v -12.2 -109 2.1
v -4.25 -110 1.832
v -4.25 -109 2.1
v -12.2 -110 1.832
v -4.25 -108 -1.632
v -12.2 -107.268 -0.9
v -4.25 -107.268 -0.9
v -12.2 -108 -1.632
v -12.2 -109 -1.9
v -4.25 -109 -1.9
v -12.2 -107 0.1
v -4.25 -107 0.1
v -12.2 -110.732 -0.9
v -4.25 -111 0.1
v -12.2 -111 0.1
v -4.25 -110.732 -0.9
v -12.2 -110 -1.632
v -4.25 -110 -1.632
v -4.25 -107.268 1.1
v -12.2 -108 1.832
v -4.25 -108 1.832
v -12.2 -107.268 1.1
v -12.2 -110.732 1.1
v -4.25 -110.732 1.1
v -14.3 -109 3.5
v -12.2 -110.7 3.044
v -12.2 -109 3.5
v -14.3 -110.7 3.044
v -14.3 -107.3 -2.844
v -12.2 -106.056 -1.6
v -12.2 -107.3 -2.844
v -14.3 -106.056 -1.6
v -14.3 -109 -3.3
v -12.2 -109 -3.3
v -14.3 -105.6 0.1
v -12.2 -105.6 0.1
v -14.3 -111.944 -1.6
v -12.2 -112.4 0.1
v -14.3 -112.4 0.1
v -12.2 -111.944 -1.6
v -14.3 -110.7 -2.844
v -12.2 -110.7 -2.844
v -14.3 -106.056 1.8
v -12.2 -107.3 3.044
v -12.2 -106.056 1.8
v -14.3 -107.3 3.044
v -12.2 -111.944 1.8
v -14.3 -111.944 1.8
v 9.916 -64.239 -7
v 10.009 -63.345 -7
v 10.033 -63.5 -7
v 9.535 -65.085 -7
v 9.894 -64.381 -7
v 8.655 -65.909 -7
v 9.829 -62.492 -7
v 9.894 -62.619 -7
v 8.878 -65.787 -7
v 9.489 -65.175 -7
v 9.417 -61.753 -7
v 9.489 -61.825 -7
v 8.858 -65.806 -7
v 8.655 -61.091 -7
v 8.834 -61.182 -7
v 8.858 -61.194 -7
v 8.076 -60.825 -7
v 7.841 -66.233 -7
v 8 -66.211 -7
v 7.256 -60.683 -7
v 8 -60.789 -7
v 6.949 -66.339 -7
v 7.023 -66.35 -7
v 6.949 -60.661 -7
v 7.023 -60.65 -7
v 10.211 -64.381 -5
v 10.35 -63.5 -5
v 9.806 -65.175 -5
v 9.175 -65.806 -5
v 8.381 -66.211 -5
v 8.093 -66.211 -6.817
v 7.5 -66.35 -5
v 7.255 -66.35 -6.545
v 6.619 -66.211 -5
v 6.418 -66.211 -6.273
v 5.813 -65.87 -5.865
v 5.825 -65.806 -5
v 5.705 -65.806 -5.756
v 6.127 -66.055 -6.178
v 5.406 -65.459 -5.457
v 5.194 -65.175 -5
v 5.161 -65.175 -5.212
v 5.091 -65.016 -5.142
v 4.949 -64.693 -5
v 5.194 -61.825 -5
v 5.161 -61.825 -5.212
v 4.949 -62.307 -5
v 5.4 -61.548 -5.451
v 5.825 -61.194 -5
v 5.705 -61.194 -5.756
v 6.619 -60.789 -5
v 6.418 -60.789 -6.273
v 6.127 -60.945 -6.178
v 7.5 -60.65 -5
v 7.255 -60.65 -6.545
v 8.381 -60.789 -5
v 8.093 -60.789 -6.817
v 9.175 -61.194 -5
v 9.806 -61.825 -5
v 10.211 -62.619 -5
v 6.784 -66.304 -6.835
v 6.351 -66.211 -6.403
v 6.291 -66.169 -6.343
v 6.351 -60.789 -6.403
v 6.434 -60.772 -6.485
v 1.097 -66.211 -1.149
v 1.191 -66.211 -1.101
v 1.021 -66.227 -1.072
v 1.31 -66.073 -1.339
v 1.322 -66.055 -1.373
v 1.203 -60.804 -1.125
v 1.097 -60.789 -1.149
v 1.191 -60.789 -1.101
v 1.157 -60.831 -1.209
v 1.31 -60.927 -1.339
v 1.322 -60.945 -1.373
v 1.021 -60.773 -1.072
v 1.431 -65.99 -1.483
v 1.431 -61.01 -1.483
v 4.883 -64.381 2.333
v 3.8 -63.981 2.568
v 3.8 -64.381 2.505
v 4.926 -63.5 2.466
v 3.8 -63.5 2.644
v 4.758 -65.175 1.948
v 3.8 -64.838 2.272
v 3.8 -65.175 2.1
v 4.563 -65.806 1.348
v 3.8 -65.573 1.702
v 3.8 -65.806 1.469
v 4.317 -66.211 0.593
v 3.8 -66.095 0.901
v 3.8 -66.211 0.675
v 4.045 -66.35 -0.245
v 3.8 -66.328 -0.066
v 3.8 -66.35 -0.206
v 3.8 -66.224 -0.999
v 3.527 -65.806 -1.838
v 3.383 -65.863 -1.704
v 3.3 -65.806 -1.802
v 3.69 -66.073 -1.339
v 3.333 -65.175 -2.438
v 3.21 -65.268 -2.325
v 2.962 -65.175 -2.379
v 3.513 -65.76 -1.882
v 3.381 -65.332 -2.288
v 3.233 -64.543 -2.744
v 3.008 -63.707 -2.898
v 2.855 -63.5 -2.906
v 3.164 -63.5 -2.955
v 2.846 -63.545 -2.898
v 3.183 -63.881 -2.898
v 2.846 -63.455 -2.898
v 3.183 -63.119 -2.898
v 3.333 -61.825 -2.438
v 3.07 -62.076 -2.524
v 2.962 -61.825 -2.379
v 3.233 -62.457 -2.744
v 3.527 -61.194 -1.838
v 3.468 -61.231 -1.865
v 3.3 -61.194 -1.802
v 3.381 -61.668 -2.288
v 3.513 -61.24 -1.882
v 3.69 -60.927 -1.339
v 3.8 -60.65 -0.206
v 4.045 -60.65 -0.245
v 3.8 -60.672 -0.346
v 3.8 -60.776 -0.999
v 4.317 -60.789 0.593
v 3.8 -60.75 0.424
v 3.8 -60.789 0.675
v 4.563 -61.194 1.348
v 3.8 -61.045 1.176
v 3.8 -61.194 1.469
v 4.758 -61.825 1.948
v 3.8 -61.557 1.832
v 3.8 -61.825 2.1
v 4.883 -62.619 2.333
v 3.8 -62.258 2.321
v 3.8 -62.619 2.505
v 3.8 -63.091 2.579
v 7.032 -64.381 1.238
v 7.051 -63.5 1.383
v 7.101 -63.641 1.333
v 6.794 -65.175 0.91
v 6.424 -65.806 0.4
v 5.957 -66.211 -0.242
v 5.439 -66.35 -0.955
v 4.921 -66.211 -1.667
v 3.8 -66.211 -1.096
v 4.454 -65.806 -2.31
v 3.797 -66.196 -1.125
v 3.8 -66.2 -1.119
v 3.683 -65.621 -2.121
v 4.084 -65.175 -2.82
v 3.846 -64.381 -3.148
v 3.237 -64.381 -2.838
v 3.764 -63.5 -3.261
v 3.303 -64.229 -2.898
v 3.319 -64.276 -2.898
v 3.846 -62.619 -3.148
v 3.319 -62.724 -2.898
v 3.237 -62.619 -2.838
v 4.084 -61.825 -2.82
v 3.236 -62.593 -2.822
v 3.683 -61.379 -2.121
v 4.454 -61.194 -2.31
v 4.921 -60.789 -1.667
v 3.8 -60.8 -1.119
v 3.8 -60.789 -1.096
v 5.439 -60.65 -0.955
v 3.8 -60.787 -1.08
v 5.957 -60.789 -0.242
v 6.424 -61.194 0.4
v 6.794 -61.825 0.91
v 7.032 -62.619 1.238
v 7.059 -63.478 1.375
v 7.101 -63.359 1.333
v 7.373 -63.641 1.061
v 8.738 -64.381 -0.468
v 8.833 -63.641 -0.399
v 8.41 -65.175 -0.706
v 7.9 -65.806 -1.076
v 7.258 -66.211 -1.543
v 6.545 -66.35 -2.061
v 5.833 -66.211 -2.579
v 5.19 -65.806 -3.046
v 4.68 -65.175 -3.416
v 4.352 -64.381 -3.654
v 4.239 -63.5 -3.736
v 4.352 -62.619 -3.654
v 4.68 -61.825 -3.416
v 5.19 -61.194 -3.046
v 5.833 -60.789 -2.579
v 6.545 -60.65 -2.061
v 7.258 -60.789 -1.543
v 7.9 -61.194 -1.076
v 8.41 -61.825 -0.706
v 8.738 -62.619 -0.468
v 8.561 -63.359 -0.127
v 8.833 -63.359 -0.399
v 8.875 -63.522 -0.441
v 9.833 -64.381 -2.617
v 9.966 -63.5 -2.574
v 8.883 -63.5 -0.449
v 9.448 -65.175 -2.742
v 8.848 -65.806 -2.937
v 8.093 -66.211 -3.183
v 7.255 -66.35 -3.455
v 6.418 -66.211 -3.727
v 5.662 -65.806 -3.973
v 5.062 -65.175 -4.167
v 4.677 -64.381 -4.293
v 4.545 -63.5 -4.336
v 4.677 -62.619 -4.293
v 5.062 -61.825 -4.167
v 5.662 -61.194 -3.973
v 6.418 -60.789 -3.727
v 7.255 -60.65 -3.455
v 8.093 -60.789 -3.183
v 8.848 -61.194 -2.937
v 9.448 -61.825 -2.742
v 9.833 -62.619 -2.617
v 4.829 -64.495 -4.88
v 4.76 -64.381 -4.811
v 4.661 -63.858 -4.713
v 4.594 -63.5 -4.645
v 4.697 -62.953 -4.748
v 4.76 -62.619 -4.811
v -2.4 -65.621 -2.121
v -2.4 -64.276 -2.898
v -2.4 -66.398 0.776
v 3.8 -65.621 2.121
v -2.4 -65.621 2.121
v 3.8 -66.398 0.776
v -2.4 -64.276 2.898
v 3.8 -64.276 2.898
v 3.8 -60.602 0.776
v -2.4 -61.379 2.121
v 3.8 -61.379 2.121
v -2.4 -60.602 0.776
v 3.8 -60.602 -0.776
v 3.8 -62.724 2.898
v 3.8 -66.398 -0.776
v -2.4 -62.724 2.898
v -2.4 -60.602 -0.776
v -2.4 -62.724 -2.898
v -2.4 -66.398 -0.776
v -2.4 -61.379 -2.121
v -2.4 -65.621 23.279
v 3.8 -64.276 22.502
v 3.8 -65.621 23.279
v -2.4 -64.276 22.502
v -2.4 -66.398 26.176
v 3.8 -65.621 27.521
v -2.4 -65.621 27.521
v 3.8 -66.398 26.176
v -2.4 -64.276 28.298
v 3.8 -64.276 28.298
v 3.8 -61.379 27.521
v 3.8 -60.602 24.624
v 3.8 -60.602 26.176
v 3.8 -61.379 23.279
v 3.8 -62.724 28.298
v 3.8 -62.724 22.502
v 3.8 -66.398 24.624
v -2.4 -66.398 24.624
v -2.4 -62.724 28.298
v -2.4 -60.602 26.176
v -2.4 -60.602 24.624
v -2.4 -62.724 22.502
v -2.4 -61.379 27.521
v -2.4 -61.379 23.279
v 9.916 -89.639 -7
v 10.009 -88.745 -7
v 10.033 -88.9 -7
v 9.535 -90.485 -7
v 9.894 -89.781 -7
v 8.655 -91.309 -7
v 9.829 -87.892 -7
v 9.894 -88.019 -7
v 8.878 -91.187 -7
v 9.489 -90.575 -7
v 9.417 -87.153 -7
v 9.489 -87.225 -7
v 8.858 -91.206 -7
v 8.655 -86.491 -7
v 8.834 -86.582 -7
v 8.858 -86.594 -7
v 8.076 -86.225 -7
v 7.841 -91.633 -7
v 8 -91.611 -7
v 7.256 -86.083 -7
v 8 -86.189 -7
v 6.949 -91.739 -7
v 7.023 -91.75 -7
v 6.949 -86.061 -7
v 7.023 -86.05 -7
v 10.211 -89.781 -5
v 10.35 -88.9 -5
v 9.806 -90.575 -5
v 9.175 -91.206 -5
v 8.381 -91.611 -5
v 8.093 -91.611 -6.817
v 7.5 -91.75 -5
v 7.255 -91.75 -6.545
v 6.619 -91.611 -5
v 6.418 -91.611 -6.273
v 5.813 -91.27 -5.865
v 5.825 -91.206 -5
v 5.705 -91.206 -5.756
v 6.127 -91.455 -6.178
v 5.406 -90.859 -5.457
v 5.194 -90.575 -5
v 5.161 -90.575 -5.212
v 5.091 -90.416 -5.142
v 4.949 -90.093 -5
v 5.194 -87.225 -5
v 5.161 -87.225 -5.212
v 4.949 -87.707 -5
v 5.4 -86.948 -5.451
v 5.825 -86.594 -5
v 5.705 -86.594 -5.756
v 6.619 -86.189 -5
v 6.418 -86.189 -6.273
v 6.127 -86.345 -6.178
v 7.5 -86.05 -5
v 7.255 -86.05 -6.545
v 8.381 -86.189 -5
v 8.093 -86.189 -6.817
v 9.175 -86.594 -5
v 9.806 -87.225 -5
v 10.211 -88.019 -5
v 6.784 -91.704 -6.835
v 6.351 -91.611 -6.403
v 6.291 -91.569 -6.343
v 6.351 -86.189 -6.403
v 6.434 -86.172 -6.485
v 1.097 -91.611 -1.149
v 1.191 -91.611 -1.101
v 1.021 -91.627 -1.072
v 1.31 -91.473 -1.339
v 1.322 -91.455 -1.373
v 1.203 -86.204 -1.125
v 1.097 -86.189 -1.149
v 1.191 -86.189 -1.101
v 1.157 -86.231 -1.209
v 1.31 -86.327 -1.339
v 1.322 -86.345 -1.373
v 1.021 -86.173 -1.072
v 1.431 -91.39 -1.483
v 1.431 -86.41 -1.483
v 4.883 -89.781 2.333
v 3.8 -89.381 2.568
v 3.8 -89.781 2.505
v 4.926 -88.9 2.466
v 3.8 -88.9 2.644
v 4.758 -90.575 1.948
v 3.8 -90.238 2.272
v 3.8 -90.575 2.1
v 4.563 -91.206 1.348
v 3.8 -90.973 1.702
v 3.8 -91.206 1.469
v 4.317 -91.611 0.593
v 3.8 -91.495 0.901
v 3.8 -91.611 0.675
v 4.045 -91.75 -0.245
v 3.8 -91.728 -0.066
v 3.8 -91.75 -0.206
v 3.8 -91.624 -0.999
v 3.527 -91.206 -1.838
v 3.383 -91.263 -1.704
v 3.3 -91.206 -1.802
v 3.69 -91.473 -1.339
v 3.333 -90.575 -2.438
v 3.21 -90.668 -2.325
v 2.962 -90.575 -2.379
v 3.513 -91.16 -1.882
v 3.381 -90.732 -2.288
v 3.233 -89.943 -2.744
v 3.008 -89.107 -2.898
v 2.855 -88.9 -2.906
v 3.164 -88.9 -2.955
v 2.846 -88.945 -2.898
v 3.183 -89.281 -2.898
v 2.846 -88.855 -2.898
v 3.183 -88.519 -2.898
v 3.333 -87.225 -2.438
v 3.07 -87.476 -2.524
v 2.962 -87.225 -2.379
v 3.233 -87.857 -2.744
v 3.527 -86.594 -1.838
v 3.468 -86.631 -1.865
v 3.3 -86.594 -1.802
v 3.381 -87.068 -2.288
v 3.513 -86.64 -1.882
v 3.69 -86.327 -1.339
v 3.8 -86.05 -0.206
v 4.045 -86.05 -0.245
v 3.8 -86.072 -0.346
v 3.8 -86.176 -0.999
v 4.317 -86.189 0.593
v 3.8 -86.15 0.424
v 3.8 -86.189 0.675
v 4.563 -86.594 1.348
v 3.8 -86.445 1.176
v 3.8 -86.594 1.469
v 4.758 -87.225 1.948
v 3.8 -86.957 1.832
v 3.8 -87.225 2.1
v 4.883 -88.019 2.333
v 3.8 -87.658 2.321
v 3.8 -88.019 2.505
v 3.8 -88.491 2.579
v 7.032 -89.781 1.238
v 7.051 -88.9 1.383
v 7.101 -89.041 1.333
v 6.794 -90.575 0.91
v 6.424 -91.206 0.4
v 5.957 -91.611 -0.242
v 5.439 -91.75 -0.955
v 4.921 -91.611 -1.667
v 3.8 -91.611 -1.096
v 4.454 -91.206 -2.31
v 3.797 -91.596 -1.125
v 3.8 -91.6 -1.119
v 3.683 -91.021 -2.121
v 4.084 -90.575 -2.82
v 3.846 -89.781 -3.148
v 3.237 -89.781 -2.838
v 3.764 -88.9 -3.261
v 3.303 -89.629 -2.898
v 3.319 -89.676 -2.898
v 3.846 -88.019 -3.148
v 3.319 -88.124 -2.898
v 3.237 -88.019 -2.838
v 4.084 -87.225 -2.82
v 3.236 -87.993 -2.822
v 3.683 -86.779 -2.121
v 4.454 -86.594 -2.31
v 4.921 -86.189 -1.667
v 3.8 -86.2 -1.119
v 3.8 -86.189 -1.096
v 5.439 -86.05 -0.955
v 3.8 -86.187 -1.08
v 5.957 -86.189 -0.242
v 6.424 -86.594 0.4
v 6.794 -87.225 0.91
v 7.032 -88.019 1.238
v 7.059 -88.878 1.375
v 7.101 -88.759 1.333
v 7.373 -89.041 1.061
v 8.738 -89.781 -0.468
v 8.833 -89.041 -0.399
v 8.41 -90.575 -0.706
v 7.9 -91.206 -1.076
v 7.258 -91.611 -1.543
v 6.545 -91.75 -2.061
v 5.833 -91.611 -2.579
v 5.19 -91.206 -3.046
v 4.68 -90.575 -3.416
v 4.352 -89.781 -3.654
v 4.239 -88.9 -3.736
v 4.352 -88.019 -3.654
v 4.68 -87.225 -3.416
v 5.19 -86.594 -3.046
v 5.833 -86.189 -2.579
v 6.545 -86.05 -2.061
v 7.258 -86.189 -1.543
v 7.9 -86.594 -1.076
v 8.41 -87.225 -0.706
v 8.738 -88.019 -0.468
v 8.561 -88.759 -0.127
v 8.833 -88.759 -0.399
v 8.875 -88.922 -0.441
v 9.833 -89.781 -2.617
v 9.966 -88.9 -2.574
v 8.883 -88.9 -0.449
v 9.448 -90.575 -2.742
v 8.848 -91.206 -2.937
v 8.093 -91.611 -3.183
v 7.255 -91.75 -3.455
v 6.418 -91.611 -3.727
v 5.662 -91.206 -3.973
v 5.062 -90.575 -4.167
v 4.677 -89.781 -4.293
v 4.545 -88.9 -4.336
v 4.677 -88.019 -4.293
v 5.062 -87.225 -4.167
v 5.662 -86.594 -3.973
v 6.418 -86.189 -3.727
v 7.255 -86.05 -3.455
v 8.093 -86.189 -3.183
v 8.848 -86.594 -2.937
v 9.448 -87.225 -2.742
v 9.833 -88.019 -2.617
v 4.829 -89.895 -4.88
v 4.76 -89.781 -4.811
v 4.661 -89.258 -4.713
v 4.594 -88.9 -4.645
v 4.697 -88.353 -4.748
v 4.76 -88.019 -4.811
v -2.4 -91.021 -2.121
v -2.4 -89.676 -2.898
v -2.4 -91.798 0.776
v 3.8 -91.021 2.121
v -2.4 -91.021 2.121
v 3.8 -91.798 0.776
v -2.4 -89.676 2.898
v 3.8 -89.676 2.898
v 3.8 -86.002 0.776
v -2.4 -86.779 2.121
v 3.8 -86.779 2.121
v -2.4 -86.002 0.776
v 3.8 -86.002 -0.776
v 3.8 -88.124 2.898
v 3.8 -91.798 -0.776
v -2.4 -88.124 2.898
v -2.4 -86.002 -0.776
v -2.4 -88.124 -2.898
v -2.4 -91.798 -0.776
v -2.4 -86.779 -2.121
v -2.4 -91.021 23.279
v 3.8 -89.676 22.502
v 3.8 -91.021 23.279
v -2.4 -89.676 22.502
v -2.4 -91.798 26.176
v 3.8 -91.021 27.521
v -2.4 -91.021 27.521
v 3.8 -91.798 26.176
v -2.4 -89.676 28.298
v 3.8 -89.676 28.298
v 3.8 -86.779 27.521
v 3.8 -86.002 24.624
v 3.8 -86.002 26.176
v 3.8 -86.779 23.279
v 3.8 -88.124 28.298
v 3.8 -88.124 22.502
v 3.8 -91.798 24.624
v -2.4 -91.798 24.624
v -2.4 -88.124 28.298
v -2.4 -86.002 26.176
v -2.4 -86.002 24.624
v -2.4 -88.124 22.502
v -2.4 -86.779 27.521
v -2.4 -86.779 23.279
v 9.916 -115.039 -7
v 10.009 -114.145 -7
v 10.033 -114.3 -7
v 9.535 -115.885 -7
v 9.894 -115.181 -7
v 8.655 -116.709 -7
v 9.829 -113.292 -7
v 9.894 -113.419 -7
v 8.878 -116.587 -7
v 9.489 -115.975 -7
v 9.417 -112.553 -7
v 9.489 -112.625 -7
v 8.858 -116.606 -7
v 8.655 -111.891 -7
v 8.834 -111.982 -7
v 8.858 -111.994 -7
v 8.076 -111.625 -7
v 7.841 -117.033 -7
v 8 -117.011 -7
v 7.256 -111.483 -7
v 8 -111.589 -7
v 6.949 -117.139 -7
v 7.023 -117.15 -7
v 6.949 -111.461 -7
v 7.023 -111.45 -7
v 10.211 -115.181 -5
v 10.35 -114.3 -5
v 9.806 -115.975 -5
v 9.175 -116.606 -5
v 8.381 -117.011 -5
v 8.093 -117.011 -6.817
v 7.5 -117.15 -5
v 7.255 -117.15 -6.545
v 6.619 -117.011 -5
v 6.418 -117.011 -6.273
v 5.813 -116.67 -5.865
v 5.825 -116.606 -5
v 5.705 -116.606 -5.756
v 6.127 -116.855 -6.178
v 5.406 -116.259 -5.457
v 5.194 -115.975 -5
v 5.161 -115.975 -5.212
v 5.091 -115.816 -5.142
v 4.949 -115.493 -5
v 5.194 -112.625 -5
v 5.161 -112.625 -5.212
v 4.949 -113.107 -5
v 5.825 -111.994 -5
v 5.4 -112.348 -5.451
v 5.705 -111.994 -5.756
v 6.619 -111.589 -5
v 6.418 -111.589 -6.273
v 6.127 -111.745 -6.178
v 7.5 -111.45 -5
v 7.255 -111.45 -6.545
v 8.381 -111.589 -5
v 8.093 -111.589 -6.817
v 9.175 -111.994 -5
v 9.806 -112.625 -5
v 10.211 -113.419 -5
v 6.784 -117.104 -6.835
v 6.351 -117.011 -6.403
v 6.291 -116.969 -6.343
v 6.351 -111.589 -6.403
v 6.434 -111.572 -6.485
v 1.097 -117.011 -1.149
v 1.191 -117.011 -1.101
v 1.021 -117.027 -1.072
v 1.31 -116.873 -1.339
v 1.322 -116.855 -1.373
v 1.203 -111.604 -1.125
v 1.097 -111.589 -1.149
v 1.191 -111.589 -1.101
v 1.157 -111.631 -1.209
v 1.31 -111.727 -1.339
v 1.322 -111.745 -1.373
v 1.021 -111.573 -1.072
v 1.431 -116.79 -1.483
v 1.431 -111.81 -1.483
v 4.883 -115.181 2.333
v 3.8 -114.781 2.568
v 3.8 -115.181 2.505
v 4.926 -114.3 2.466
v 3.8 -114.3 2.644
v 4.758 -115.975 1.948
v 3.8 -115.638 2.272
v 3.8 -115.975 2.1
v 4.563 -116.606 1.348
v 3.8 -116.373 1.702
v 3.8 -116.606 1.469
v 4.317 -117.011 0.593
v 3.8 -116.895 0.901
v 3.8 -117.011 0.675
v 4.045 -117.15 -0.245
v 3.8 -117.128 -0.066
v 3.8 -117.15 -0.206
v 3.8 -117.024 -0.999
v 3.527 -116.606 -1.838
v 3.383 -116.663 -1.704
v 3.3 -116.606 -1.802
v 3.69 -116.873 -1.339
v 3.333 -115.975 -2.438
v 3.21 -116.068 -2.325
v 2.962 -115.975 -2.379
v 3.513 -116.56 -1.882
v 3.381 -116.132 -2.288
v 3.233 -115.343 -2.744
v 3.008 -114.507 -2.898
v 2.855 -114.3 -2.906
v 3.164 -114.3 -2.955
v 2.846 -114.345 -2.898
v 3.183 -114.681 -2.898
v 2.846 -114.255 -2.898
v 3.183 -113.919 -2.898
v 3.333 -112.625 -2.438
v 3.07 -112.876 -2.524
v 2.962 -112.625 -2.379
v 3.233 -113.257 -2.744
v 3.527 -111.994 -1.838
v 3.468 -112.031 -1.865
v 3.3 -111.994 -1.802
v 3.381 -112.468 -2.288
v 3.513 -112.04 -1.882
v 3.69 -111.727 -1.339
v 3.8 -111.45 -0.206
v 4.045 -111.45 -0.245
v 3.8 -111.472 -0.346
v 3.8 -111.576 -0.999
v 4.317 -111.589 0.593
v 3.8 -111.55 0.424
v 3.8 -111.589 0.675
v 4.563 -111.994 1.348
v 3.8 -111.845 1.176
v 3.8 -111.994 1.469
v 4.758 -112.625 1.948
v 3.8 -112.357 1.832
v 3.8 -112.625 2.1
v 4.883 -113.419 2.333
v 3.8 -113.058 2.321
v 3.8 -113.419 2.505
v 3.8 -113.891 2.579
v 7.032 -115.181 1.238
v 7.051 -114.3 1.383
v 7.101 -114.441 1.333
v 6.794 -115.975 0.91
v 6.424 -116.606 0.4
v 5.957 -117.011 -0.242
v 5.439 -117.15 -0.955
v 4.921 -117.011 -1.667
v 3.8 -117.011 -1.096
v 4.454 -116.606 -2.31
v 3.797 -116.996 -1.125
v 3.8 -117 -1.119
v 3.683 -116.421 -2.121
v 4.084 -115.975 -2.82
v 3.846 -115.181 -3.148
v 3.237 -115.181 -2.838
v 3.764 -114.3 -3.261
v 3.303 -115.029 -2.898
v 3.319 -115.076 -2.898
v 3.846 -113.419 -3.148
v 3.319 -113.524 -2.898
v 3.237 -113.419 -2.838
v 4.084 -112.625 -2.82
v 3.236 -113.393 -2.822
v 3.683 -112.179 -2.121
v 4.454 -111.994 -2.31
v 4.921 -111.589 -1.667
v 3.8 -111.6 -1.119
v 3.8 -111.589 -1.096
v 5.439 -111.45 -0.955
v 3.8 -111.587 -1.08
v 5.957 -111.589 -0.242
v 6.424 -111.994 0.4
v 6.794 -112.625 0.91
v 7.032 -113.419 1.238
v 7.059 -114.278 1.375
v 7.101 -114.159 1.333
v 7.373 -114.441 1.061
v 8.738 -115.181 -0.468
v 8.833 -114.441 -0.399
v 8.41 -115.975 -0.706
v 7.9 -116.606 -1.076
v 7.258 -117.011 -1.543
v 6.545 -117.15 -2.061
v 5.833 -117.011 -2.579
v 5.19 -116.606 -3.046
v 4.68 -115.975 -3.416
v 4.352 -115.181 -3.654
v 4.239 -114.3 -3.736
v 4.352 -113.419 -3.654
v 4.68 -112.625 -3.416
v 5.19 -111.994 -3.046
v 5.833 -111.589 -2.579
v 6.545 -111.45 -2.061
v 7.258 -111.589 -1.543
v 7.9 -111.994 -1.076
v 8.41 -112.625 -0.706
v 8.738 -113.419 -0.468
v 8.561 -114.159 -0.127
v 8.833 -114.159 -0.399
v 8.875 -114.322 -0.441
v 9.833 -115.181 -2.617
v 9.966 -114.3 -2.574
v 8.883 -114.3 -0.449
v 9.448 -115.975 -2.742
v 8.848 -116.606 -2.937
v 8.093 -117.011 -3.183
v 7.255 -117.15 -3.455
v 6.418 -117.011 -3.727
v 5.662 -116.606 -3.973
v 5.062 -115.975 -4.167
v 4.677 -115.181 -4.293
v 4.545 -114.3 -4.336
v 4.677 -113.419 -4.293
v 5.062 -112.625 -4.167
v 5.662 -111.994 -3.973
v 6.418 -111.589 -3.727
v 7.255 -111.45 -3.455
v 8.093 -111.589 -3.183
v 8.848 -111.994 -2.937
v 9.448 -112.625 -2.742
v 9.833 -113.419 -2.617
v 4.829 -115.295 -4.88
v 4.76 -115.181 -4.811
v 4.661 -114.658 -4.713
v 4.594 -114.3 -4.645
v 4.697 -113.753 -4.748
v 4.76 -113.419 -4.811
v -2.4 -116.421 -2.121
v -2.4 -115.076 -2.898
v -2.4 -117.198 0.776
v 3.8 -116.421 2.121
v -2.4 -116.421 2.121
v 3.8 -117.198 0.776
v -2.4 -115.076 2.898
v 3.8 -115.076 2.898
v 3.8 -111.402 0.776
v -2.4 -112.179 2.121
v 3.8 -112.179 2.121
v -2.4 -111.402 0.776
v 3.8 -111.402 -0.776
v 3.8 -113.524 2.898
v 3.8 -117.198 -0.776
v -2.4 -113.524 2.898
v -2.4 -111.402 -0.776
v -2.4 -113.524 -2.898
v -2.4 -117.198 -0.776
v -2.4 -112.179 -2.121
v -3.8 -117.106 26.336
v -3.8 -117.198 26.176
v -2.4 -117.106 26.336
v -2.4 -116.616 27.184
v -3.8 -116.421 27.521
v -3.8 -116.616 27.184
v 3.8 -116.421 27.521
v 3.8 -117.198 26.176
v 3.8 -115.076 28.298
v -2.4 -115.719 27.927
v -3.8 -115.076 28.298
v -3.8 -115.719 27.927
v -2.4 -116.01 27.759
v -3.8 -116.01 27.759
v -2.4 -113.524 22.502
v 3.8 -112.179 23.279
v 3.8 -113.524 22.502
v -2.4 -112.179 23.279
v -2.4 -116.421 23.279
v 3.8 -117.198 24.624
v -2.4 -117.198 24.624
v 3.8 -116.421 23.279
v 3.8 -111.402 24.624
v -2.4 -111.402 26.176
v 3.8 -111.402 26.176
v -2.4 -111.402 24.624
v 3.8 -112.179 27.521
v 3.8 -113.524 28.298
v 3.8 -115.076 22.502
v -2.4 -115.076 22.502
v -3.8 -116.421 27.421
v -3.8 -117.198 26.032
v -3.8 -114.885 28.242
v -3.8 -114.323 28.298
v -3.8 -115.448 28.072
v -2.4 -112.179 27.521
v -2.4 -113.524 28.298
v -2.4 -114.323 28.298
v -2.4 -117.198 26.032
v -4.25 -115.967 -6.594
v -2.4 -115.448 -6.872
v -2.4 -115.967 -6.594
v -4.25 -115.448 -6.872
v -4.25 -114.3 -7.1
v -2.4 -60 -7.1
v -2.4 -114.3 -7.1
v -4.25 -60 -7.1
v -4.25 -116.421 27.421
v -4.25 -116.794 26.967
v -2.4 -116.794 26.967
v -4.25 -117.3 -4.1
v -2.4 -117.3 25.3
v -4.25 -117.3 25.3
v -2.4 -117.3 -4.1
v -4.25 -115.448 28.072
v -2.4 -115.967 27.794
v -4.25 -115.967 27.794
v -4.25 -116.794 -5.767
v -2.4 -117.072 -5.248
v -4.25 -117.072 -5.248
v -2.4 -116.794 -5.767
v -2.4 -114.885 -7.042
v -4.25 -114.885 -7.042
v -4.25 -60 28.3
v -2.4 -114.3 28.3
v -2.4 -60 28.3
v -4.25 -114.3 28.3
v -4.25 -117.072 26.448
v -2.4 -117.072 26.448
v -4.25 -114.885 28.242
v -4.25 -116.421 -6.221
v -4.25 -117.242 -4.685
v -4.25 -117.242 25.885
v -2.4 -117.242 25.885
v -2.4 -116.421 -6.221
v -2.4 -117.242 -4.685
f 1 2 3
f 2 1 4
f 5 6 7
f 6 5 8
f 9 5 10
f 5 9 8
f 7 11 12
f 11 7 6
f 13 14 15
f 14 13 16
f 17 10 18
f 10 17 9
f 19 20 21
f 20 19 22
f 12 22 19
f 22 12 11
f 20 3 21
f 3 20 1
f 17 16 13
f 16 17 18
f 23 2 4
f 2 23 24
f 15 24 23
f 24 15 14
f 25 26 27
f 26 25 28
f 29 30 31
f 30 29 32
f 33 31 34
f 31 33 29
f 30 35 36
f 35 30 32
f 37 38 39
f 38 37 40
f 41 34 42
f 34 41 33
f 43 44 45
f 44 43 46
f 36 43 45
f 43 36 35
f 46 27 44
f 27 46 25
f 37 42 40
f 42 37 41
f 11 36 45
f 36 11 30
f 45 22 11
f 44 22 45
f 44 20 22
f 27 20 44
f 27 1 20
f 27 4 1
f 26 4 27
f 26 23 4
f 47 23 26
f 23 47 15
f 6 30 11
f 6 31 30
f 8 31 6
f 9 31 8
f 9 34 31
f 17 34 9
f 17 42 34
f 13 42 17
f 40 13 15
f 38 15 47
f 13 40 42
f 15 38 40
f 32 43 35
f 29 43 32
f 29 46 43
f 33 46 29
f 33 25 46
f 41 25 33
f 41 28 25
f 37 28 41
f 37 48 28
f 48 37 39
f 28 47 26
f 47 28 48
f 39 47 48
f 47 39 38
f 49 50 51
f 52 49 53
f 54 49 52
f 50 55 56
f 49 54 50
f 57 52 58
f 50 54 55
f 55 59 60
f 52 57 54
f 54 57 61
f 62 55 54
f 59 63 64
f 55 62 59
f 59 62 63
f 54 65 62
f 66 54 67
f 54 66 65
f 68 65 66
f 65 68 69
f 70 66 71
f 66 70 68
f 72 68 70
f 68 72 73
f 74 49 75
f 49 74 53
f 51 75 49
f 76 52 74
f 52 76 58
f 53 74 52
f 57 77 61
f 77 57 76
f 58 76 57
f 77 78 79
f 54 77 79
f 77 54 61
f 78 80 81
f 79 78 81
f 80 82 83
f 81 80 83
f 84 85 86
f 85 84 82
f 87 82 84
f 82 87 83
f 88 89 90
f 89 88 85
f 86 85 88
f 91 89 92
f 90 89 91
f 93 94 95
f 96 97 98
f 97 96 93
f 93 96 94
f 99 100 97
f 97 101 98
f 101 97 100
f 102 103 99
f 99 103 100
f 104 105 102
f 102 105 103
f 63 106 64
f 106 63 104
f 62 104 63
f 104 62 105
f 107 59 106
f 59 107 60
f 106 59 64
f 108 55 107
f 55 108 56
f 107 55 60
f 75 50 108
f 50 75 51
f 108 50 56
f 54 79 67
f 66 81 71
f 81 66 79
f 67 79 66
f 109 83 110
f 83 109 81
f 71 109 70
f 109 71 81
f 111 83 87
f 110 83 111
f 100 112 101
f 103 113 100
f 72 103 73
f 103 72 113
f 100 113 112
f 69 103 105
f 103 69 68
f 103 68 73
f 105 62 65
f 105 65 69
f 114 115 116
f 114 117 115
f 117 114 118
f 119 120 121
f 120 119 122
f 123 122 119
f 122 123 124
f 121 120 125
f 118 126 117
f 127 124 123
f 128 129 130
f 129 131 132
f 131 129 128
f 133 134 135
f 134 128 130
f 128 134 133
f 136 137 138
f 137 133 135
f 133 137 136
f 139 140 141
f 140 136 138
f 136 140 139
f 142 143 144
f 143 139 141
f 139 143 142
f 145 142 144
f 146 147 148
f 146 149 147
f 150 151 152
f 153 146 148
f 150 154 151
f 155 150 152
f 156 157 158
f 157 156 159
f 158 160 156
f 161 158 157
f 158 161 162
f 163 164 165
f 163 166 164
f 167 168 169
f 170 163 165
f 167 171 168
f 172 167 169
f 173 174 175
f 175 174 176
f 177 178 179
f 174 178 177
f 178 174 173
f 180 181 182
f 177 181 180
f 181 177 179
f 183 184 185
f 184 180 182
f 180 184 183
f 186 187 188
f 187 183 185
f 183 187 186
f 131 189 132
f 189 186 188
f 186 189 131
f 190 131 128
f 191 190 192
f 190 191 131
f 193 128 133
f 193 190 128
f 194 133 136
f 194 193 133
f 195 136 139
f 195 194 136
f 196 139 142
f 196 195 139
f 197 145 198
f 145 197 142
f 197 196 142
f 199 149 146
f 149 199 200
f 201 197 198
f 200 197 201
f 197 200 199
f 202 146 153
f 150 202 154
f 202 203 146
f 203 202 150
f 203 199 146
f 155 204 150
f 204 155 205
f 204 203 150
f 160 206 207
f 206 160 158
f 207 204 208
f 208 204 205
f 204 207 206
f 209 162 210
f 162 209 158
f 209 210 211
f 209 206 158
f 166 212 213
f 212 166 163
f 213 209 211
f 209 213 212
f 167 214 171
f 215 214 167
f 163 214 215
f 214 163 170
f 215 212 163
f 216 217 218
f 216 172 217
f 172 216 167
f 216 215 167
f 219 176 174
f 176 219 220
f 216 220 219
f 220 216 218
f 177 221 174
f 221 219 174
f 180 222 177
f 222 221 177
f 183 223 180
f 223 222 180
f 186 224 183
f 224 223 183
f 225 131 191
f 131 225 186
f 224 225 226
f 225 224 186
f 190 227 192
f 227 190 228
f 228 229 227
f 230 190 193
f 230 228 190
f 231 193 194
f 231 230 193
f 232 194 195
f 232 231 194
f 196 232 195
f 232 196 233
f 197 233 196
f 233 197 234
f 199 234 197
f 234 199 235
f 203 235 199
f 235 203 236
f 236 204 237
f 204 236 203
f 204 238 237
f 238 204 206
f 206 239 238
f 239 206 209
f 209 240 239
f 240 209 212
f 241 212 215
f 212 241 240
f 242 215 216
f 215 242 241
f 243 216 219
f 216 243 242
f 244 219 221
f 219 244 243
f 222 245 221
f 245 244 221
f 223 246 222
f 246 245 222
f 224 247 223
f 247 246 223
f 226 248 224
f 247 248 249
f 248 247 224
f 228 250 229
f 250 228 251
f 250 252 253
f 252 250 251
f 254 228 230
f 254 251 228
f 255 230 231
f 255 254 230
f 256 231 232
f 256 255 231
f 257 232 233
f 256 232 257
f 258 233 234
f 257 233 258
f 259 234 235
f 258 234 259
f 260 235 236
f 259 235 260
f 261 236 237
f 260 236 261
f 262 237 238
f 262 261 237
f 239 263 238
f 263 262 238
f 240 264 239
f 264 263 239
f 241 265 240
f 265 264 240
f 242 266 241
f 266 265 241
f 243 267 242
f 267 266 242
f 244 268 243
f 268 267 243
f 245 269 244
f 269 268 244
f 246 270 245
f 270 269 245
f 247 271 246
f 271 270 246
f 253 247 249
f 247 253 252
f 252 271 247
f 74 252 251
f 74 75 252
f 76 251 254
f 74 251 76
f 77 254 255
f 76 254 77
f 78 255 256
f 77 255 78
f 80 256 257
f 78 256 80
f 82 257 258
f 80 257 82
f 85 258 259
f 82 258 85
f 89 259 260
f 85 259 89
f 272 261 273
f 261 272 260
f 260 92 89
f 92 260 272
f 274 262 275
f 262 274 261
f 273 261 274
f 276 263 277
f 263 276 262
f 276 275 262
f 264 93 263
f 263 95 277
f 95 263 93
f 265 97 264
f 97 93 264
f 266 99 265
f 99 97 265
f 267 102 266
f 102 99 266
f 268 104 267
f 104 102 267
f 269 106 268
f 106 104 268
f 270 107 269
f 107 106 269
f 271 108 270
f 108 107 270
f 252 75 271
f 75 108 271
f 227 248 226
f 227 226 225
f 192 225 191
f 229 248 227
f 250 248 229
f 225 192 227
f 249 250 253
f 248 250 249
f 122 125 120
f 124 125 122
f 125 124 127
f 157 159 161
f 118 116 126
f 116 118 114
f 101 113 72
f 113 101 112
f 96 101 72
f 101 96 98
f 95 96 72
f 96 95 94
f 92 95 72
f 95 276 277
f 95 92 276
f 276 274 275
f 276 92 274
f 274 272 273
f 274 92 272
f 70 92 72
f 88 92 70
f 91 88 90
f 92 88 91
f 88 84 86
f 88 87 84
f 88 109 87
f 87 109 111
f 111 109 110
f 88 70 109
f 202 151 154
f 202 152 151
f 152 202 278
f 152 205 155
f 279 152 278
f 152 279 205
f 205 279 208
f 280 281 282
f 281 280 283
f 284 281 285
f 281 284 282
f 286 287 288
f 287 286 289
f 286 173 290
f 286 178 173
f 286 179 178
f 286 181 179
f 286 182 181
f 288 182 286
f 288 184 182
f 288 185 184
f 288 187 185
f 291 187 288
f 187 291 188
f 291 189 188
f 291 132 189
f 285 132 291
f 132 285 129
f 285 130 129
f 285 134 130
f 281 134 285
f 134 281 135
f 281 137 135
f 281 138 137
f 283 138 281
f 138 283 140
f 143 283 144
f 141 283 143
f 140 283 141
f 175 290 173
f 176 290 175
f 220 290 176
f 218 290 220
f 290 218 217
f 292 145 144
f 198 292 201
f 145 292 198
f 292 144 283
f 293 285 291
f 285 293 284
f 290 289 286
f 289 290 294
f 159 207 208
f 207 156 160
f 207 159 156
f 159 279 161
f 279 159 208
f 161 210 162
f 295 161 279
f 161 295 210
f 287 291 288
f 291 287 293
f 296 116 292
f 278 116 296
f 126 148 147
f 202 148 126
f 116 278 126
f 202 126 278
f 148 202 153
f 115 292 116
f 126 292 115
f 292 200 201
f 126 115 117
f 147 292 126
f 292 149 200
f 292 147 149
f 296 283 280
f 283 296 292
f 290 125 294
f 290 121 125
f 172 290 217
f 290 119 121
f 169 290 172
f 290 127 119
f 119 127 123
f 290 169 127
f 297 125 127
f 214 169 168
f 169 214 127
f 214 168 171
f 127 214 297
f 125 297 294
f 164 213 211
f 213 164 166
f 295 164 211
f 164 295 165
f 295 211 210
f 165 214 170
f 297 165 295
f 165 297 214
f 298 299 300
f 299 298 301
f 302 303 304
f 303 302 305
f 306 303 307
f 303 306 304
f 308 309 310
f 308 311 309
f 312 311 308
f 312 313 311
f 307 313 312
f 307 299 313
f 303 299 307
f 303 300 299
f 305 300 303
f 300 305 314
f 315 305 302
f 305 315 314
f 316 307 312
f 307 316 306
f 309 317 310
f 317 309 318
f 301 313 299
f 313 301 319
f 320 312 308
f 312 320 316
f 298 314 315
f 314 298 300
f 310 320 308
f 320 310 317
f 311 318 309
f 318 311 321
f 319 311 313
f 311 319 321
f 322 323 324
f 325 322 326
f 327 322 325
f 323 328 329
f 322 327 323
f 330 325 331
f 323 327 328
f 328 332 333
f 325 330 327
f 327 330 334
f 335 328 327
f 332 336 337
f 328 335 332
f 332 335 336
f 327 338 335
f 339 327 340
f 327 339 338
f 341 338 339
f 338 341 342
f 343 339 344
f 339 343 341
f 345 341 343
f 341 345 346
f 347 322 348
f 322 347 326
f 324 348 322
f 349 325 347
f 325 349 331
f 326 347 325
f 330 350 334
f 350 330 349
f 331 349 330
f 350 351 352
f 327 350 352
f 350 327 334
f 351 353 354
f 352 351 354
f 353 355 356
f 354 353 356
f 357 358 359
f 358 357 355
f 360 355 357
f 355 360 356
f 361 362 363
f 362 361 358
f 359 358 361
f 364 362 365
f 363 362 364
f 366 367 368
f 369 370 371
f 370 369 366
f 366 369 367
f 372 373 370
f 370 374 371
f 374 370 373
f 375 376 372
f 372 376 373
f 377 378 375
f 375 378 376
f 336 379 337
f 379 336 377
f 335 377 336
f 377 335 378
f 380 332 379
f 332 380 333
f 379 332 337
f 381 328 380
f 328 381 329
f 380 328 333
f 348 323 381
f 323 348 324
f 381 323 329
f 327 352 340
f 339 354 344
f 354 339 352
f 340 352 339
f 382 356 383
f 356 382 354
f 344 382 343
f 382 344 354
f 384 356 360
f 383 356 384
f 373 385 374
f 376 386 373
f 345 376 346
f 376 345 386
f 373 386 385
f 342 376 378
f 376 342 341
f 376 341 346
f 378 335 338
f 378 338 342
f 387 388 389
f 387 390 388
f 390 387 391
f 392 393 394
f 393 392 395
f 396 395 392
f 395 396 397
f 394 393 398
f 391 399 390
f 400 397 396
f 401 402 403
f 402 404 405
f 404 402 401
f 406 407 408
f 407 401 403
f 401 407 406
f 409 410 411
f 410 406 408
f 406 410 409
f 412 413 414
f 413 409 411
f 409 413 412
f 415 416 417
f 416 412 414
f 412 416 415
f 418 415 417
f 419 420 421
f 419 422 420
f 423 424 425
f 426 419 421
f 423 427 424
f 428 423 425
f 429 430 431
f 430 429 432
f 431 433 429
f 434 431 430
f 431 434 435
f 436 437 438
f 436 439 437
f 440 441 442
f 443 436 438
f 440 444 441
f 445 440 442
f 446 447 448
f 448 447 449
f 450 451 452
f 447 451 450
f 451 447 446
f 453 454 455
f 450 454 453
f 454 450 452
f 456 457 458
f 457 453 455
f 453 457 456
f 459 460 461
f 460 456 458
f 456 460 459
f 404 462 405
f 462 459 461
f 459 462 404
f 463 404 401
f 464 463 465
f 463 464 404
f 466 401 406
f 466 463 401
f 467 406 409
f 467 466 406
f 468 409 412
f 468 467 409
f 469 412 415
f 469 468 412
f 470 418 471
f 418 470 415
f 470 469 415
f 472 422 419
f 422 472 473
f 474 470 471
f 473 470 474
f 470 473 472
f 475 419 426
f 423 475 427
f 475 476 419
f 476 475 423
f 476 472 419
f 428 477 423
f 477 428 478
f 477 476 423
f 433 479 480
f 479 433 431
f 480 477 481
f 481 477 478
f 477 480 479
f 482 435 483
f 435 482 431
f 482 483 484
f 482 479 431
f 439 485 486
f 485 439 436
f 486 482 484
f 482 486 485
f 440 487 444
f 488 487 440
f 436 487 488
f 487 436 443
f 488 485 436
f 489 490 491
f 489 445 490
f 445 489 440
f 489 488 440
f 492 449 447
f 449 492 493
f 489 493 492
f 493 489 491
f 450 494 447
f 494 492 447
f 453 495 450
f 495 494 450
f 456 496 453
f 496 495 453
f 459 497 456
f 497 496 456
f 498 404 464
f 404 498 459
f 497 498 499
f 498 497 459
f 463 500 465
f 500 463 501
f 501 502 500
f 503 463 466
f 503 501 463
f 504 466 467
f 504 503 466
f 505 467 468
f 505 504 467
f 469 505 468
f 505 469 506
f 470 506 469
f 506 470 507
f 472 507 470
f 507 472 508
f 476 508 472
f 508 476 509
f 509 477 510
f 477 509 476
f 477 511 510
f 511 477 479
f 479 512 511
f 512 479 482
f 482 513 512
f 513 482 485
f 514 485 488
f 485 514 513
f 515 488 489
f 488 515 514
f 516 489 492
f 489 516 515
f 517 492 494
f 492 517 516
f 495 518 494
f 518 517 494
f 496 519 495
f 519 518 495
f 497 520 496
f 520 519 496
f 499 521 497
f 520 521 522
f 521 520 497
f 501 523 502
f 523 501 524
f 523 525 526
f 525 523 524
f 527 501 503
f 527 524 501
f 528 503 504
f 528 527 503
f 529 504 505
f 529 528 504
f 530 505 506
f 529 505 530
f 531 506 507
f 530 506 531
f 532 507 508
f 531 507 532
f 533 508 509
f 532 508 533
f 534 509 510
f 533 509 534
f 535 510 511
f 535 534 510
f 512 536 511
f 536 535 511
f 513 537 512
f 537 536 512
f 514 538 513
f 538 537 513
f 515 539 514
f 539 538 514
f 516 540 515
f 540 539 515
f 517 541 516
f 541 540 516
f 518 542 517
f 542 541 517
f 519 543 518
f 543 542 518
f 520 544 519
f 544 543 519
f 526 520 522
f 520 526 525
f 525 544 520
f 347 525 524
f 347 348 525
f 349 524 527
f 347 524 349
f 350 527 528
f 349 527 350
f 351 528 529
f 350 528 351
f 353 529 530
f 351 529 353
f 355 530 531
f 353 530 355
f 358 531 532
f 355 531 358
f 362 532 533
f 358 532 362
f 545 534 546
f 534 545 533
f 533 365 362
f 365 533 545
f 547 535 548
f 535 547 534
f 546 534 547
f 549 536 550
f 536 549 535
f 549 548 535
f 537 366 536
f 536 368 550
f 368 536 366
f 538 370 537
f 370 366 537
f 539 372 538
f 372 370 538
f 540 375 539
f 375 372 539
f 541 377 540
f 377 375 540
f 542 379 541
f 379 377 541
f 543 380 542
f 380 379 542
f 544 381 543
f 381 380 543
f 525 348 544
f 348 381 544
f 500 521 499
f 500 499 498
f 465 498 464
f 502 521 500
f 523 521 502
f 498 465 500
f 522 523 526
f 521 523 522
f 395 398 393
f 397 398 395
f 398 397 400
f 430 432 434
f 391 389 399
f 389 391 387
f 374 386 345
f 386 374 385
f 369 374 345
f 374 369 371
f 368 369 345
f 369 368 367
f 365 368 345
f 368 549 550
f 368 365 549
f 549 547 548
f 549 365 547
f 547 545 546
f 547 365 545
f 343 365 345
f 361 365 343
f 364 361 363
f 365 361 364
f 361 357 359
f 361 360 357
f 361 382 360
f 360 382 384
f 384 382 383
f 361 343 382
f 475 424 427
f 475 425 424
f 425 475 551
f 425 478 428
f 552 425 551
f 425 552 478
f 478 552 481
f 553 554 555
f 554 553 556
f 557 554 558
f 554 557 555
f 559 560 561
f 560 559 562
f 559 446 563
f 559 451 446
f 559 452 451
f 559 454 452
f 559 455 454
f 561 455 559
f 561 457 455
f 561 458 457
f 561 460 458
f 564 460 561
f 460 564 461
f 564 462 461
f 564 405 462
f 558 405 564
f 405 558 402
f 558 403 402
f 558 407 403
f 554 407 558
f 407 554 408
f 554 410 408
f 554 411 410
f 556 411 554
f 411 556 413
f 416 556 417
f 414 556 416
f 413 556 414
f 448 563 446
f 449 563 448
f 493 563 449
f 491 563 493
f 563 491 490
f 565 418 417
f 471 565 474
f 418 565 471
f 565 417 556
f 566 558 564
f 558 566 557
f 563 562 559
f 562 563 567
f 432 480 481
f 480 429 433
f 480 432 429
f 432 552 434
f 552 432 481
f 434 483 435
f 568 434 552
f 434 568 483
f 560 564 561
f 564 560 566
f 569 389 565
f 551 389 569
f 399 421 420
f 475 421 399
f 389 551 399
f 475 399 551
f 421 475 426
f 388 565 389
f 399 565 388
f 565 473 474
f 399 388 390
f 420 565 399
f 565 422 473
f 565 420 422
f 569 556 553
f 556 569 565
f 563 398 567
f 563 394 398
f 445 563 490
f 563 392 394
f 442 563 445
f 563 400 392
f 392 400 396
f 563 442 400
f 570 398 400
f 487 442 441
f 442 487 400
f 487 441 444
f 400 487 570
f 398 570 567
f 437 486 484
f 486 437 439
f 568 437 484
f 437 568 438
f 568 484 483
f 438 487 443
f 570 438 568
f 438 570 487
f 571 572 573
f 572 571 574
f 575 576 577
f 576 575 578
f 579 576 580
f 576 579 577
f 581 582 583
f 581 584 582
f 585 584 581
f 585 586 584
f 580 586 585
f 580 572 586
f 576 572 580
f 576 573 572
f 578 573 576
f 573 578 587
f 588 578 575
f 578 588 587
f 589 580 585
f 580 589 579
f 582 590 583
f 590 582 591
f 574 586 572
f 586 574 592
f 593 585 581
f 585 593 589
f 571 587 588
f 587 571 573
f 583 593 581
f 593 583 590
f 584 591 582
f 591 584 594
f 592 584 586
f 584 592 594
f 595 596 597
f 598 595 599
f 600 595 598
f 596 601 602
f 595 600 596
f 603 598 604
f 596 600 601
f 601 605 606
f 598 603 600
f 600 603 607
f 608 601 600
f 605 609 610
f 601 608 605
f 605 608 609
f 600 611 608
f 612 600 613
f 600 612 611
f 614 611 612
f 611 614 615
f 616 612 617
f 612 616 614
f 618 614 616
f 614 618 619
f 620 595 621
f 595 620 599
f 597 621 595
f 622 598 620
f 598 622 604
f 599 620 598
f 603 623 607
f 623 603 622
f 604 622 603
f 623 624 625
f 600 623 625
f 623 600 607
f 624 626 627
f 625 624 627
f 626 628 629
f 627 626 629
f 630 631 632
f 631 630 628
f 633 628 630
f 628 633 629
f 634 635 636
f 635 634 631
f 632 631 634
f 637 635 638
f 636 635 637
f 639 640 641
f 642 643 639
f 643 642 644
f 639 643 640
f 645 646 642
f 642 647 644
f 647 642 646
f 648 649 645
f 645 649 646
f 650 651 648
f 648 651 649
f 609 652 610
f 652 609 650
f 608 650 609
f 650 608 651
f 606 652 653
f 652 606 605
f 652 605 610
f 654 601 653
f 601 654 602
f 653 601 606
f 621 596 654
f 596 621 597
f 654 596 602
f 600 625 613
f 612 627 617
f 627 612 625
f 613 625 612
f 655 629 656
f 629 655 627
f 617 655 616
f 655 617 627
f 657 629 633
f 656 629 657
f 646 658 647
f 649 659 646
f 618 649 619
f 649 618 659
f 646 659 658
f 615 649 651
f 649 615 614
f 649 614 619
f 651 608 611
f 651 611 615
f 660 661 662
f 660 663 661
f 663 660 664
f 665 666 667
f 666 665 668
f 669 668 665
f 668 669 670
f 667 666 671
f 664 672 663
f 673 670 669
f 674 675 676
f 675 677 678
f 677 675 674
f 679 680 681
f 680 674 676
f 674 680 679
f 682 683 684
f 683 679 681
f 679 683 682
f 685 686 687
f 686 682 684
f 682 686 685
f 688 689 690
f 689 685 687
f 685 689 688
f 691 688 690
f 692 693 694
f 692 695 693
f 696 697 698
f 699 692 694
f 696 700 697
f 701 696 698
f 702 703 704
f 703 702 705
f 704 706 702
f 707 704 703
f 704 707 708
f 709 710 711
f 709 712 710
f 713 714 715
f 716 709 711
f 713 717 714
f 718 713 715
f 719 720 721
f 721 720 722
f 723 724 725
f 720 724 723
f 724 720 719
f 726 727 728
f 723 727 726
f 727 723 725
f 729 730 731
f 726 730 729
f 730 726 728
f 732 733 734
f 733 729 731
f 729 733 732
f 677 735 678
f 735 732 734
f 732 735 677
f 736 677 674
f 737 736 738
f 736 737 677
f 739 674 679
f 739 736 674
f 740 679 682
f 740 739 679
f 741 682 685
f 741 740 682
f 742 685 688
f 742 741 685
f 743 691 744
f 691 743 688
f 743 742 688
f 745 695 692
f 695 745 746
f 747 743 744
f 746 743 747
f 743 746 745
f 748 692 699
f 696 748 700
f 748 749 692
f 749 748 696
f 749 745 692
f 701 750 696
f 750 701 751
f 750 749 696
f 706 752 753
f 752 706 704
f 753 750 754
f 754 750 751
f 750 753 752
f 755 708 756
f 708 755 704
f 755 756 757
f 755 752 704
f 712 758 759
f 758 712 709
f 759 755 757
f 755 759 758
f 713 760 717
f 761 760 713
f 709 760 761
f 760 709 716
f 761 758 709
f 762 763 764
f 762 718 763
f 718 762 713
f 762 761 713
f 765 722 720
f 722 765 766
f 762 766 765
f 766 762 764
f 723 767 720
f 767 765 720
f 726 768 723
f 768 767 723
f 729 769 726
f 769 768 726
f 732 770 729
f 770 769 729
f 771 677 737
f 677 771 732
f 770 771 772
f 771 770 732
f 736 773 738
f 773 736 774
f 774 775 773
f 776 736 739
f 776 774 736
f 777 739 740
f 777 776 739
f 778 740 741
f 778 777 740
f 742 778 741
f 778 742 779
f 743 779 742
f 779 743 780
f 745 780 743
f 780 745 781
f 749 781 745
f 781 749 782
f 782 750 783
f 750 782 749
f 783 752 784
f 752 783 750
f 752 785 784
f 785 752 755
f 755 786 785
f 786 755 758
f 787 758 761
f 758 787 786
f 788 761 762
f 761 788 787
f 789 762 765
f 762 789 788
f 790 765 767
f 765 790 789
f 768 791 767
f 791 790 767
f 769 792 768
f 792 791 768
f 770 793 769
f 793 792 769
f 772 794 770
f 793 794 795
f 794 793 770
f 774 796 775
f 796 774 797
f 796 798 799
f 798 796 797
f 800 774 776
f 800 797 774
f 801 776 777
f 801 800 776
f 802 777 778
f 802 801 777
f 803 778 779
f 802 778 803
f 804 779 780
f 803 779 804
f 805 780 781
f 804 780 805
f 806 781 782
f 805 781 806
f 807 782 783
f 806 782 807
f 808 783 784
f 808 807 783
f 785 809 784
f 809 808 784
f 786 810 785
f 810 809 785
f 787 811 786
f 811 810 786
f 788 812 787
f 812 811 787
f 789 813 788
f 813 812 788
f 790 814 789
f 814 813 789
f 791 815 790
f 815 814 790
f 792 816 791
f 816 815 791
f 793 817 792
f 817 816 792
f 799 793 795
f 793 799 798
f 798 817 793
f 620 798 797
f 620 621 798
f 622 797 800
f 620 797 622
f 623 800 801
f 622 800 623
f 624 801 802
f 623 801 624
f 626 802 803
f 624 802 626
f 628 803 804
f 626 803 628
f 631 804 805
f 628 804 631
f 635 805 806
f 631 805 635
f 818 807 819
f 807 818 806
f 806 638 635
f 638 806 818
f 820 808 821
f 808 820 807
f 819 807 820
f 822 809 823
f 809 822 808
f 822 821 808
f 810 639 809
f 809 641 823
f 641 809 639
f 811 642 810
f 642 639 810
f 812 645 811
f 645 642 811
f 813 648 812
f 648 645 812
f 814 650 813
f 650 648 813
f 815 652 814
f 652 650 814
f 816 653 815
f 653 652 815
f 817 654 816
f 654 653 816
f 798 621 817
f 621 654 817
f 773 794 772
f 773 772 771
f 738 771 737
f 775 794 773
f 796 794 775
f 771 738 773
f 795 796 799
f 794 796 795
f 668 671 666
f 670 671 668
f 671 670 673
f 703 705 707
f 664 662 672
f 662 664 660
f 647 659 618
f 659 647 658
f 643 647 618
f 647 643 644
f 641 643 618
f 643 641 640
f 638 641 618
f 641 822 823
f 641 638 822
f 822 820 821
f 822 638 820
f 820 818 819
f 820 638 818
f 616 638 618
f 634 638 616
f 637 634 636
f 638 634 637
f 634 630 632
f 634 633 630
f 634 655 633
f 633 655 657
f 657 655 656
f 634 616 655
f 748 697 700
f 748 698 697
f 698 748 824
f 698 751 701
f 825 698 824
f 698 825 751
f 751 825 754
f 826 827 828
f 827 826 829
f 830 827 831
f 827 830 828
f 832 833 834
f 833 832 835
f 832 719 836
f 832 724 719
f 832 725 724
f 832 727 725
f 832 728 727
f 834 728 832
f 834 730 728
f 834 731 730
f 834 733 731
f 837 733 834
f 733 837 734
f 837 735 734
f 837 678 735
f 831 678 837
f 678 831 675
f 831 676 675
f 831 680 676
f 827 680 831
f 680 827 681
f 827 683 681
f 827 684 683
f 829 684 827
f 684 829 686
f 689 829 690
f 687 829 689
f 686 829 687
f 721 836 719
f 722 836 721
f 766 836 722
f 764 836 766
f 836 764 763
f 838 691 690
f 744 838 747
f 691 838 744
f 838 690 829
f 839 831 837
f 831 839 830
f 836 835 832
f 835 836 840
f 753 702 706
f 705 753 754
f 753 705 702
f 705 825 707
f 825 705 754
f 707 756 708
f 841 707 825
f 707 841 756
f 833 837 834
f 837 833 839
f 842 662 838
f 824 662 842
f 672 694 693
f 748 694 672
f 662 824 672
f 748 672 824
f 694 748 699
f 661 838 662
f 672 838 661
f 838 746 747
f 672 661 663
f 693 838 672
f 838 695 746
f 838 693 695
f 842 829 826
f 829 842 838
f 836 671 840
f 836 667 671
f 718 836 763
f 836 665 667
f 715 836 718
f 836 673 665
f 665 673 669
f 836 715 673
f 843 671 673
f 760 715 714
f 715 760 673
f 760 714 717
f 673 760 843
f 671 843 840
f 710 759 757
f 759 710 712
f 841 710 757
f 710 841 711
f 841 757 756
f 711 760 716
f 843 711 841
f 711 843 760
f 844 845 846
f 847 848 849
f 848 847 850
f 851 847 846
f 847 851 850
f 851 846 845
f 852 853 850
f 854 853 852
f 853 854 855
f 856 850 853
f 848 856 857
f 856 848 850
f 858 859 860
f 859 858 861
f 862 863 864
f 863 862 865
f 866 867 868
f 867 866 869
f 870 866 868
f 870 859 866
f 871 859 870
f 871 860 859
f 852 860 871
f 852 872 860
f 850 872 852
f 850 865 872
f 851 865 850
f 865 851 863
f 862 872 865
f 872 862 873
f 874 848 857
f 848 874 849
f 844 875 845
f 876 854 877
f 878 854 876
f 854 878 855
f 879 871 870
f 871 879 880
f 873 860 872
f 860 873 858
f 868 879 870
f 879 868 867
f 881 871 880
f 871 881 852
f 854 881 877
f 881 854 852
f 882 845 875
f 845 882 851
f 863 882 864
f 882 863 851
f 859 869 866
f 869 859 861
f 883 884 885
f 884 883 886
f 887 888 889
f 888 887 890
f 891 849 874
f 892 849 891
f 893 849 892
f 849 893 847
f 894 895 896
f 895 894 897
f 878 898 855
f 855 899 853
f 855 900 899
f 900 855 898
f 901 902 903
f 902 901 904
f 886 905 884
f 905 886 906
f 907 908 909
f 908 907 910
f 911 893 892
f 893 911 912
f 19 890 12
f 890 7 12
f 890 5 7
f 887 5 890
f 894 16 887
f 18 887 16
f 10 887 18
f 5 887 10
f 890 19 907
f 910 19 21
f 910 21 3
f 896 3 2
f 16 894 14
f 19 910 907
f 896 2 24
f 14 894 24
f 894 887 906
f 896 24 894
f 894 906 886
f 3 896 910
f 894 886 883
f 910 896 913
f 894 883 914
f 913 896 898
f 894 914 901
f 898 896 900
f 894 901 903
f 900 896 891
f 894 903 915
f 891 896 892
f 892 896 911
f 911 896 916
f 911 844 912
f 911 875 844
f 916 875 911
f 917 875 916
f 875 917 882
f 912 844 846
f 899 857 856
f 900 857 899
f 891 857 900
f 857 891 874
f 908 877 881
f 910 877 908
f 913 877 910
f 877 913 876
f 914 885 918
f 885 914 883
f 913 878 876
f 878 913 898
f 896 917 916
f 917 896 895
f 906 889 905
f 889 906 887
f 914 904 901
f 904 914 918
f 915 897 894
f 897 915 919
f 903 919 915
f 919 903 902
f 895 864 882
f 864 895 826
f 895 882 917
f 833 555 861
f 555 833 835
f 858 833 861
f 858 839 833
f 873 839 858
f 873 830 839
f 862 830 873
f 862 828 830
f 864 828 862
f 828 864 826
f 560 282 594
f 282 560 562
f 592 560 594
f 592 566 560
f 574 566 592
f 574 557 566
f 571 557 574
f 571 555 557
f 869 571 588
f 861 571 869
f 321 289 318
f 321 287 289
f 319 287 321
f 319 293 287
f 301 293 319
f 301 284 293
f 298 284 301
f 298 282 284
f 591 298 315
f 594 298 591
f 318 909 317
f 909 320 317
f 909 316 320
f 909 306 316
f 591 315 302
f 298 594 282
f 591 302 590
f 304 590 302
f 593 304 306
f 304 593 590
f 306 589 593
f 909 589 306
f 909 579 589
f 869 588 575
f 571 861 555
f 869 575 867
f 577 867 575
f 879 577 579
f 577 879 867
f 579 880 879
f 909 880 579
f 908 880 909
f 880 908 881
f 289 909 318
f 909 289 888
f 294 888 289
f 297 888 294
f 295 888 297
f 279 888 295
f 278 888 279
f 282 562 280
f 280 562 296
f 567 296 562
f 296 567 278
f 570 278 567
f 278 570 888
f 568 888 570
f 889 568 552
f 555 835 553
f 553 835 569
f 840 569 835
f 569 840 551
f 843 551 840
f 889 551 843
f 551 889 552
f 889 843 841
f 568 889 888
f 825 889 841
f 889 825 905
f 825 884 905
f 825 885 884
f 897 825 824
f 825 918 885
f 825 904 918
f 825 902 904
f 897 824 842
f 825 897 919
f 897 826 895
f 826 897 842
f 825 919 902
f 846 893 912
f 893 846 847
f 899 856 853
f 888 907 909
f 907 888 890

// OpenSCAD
// Thingiverse: https://www.thingiverse.com/thing:3183037
// keyhole slot remix of PEGSTR - Pegboard Wizard
// Modified by Shawn Featherly, October 2018
// Original PEGSTR - Pegboard Wizard by Marius Gheorghescu, November 2014

// preview[view:north, tilt:bottom diagonal]

// width / diameter of the keyslot neck in mm
key_neck_width = 4;

// length of keyslot exposed neck in mm
key_neck_length = 8;

// width / diameter of the keyslot head in mm
key_head_width = 6.8;

// length of the keyslot head in mm
key_head_length = 2;

// how far the 2 keyslots are from one another. 24.3  25.4
keyslot_seperation = 218;//218;  //  8.56 = 8 9/16 in(=21.75cm)    21.9 cm (=8.6in)
//  (DLink was 174.5mm  6 7/8 in)

// how thick are the walls. Hint: 6*extrusion width produces the best results.
wall_thickness = 1.85;

/* [Advanced] */
// what ratio of the holders bottom is reinforced to the plate [0.0-1.0]
strength_factor = 0.66;


/* [Hidden] */
// width of the panel
holder_x_size = keyslot_seperation + 10;

// depth of the orifice
holder_y_size = 10;

// hight of the holder
holder_height = 15;

// how many times to repeat the holder on X axis
holder_x_count = 1;

// how many times to repeat the holder on Y axis
holder_y_count = 2;

// orifice corner radius (roundness). Needs to be less than min(x,y)/2.
corner_radius = 30;

// what is the $fn parameter
holder_sides = max(50, min(20, holder_x_size*2));

// dimensions the same outside US?
hole_spacing = 25.4;
hole_size = 6;//6.0035;
board_thickness = 5;


holder_total_x = wall_thickness + holder_x_count*(wall_thickness+holder_x_size);
holder_total_y = wall_thickness + holder_y_count*(wall_thickness+holder_y_size);
holder_total_z = round(holder_height/hole_spacing)*hole_spacing;
holder_roundness = min(corner_radius, holder_x_size/2, holder_y_size/2); 


// what is the $fn parameter for holders
fn = 32;

epsilon = 0.1;

clip_height = 2*hole_size + 2;
$fn = fn;

module round_rect_ex(x1, y1, x2, y2, z, r1, r2)
{
	$fn=holder_sides;
	brim = z/10;

	//rotate([0,0,(holder_sides==6)?30:((holder_sides==4)?45:0)])
	hull() {
        translate([-x1/2 + r1, y1/2 - r1, z/2-brim/2])
            cylinder(r=r1, h=brim,center=true);
        translate([x1/2 - r1, y1/2 - r1, z/2-brim/2])
            cylinder(r=r1, h=brim,center=true);
        translate([-x1/2 + r1, -y1/2 + r1, z/2-brim/2])
            cylinder(r=r1, h=brim,center=true);
        translate([x1/2 - r1, -y1/2 + r1, z/2-brim/2])
            cylinder(r=r1, h=brim,center=true);

        translate([-x2/2 + r2, y2/2 - r2, -z/2+brim/2])
            cylinder(r=r2, h=brim,center=true);
        translate([x2/2 - r2, y2/2 - r2, -z/2+brim/2])
            cylinder(r=r2, h=brim,center=true);
        translate([-x2/2 + r2, -y2/2 + r2, -z/2+brim/2])
            cylinder(r=r2, h=brim,center=true);
        translate([x2/2 - r2, -y2/2 + r2, -z/2+brim/2])
            cylinder(r=r2, h=brim,center=true);

    }
}

module pin(clip)
{
	rotate([0,0,15])
		#cylinder(r=hole_size/2, h=board_thickness*1.5+epsilon, center=true, $fn=12);

// top row inserts should have a rounded tip
    
	if (clip) {
		//
		rotate([0,0,90])
		intersection() {
			translate([0, 0, hole_size-epsilon])
				cube([hole_size+2*epsilon, clip_height, 2*hole_size], center=true);

			// [-hole_size/2 - 1.95,0, board_thickness/2]
			translate([0, hole_size/2 + 2, board_thickness/2]) 
				rotate([0, 90, 0])
				rotate_extrude(convexity = 5, $fn=20)
				translate([5, 0, 0])
				 circle(r = (hole_size*0.95)/2); 
			
			translate([0, hole_size/2 + 2 - 1.6, board_thickness/2]) 
				rotate([45,0,0])
				translate([0, -0, hole_size*0.6])
					cube([hole_size+2*epsilon, 3*hole_size, hole_size], center=true);
		}
	}
}


module pinboard_clips() 
{
	rotate([0,90,0])
	for(i=[0:round(holder_total_x/hole_spacing)]) {
		for(j=[0:max(strength_factor, round(holder_height/hole_spacing))]) {

			translate([
				j*hole_spacing, 
				-hole_spacing*(round(holder_total_x/hole_spacing)/2) + i*hole_spacing, 
				0])
					pin(j==0);
		}
	}
}

module pinboard(clips)
{
	rotate([0,90,0])
	translate([-epsilon, 0, -wall_thickness - board_thickness/2 + epsilon])
	hull() {
		translate([-clip_height/2 + hole_size/2, 
			-hole_spacing*(round(holder_total_x/hole_spacing)/2),0])
			cylinder(r=hole_size/2, h=wall_thickness);

		translate([-clip_height/2 + hole_size/2, 
			hole_spacing*(round(holder_total_x/hole_spacing)/2),0])
			cylinder(r=hole_size/2,  h=wall_thickness);

		translate([max(strength_factor, round(holder_height/hole_spacing))*hole_spacing,
			-hole_spacing*(round(holder_total_x/hole_spacing)/2),0])
			cylinder(r=hole_size/2, h=wall_thickness);

		translate([max(strength_factor, round(holder_height/hole_spacing))*hole_spacing,
			hole_spacing*(round(holder_total_x/hole_spacing)/2),0])
			cylinder(r=hole_size/2,  h=wall_thickness);

	}
}

module key()
{
    // key neck
    #cylinder(r=key_neck_width/2, h=key_neck_length+epsilon, center=true, $fn=12);
    
    // key head
    //translate([0,0, -2*(key_neck_length- epsilon) - 2*key_head_length ])
    translate([0,0, -key_neck_length/2 - key_head_length/2 ])
    
    #cylinder(r=key_head_width/2, h=key_head_length+epsilon, center=true, $fn=12);
}
module keyslots();
{
	rotate([0,90,0])
	translate([-epsilon, 0, -wall_thickness - board_thickness/2 - key_neck_length/2 + epsilon])
    {
        // position keyslot1
        translate([0,-keyslot_seperation/2,0])
        key();
    
        // position keyslot2
        //translate([0,keyslot_seperation/2,0])
        //key();
    }
}
module pegstr() 
{
	difference() {
		union() {

// connects to pegboard insets
			pinboard();

// pegboard insets
			color([0,0,0])
			pinboard_clips();
            
// keyslot insets
            keyslots();
		}
        union()
        {
            cube([120,120,120], center = true);

            // This hides the right side when it's negative, the left when it's positive. Toggle it, and keyslots() keyslot1 or keyslot2, to export each side individually
            translate([0,-100,0])
            cube([120,120,120], center = true);
        }

/* Start Logo
		translate([-board_thickness/2,-1,-clip_height+5]) 
		rotate([-90,0,90]) {
			intersection() {
				union() {
					difference() {
						round_rect_ex(3, 10, 3, 10, 2, 1, 1);
						round_rect_ex(2, 9, 2, 9, 3, 1, 1);
					}
			
					translate([2.5, 0, 0]) 
						difference() {
							round_rect_ex(3, 10, 3, 10, 2, 1, 1);
							round_rect_ex(2, 9, 2, 9, 3, 1, 1);
						}
				}
			
				translate([0, -3.5, 0]) 
					cube([20,4,10], center=true);
			}
		
			translate([1.25, -2.5, 0]) 
				difference() {
					round_rect_ex(8, 7, 8, 7, 2, 1, 1);
					round_rect_ex(7, 6, 7, 6, 3, 1, 1);
		
					translate([3,0,0])
						cube([4,2.5,3], center=true);
				}
		
		
			translate([2.0, -1.0, 0]) 
				cube([8, 0.5, 2], center=true);
		
			translate([0,-2,0])
				cylinder(r=0.25, h=2, center=true, $fn=12);
		
			translate([2.5,-2,0])
				cylinder(r=0.25, h=2, center=true, $fn=12);
		}
End Logo */

	}
}


rotate([180,0,0]) pegstr();
